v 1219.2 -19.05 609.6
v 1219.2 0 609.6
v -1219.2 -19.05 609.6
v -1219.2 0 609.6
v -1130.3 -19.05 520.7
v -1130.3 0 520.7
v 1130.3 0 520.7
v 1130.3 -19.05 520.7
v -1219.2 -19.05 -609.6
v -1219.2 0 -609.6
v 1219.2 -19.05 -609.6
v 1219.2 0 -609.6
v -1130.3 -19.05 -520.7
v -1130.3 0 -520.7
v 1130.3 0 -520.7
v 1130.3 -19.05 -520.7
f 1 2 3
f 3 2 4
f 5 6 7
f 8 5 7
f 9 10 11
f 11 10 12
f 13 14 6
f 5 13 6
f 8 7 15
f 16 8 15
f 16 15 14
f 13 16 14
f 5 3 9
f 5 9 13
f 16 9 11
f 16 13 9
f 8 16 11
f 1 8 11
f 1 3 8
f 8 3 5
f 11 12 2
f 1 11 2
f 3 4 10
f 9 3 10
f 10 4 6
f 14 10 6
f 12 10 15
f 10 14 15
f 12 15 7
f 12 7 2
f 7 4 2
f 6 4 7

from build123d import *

# Parameters (mm, degrees)
F1_DEPTH = 19.05


with BuildPart() as f1:
    # F0 (on Front) → F1 (new body)
    with BuildSketch(Plane.XZ):
        Polygon((1130.3, 520.7), (1219.2, 609.6), (-1219.2, 609.6), (-1130.3, 520.7), align=None)
        Polygon((1219.2, -609.6), (1219.2, 609.6), (1130.3, 520.7), (1130.3, -520.7), align=None)
        Polygon((-1219.2, -609.6), (1219.2, -609.6), (1130.3, -520.7), (-1130.3, -520.7), align=None)
        Polygon((-1130.3, 520.7), (-1219.2, 609.6), (-1219.2, -609.6), (-1130.3, -520.7), align=None)
    extrude(amount=F1_DEPTH)


solid = f1.part
